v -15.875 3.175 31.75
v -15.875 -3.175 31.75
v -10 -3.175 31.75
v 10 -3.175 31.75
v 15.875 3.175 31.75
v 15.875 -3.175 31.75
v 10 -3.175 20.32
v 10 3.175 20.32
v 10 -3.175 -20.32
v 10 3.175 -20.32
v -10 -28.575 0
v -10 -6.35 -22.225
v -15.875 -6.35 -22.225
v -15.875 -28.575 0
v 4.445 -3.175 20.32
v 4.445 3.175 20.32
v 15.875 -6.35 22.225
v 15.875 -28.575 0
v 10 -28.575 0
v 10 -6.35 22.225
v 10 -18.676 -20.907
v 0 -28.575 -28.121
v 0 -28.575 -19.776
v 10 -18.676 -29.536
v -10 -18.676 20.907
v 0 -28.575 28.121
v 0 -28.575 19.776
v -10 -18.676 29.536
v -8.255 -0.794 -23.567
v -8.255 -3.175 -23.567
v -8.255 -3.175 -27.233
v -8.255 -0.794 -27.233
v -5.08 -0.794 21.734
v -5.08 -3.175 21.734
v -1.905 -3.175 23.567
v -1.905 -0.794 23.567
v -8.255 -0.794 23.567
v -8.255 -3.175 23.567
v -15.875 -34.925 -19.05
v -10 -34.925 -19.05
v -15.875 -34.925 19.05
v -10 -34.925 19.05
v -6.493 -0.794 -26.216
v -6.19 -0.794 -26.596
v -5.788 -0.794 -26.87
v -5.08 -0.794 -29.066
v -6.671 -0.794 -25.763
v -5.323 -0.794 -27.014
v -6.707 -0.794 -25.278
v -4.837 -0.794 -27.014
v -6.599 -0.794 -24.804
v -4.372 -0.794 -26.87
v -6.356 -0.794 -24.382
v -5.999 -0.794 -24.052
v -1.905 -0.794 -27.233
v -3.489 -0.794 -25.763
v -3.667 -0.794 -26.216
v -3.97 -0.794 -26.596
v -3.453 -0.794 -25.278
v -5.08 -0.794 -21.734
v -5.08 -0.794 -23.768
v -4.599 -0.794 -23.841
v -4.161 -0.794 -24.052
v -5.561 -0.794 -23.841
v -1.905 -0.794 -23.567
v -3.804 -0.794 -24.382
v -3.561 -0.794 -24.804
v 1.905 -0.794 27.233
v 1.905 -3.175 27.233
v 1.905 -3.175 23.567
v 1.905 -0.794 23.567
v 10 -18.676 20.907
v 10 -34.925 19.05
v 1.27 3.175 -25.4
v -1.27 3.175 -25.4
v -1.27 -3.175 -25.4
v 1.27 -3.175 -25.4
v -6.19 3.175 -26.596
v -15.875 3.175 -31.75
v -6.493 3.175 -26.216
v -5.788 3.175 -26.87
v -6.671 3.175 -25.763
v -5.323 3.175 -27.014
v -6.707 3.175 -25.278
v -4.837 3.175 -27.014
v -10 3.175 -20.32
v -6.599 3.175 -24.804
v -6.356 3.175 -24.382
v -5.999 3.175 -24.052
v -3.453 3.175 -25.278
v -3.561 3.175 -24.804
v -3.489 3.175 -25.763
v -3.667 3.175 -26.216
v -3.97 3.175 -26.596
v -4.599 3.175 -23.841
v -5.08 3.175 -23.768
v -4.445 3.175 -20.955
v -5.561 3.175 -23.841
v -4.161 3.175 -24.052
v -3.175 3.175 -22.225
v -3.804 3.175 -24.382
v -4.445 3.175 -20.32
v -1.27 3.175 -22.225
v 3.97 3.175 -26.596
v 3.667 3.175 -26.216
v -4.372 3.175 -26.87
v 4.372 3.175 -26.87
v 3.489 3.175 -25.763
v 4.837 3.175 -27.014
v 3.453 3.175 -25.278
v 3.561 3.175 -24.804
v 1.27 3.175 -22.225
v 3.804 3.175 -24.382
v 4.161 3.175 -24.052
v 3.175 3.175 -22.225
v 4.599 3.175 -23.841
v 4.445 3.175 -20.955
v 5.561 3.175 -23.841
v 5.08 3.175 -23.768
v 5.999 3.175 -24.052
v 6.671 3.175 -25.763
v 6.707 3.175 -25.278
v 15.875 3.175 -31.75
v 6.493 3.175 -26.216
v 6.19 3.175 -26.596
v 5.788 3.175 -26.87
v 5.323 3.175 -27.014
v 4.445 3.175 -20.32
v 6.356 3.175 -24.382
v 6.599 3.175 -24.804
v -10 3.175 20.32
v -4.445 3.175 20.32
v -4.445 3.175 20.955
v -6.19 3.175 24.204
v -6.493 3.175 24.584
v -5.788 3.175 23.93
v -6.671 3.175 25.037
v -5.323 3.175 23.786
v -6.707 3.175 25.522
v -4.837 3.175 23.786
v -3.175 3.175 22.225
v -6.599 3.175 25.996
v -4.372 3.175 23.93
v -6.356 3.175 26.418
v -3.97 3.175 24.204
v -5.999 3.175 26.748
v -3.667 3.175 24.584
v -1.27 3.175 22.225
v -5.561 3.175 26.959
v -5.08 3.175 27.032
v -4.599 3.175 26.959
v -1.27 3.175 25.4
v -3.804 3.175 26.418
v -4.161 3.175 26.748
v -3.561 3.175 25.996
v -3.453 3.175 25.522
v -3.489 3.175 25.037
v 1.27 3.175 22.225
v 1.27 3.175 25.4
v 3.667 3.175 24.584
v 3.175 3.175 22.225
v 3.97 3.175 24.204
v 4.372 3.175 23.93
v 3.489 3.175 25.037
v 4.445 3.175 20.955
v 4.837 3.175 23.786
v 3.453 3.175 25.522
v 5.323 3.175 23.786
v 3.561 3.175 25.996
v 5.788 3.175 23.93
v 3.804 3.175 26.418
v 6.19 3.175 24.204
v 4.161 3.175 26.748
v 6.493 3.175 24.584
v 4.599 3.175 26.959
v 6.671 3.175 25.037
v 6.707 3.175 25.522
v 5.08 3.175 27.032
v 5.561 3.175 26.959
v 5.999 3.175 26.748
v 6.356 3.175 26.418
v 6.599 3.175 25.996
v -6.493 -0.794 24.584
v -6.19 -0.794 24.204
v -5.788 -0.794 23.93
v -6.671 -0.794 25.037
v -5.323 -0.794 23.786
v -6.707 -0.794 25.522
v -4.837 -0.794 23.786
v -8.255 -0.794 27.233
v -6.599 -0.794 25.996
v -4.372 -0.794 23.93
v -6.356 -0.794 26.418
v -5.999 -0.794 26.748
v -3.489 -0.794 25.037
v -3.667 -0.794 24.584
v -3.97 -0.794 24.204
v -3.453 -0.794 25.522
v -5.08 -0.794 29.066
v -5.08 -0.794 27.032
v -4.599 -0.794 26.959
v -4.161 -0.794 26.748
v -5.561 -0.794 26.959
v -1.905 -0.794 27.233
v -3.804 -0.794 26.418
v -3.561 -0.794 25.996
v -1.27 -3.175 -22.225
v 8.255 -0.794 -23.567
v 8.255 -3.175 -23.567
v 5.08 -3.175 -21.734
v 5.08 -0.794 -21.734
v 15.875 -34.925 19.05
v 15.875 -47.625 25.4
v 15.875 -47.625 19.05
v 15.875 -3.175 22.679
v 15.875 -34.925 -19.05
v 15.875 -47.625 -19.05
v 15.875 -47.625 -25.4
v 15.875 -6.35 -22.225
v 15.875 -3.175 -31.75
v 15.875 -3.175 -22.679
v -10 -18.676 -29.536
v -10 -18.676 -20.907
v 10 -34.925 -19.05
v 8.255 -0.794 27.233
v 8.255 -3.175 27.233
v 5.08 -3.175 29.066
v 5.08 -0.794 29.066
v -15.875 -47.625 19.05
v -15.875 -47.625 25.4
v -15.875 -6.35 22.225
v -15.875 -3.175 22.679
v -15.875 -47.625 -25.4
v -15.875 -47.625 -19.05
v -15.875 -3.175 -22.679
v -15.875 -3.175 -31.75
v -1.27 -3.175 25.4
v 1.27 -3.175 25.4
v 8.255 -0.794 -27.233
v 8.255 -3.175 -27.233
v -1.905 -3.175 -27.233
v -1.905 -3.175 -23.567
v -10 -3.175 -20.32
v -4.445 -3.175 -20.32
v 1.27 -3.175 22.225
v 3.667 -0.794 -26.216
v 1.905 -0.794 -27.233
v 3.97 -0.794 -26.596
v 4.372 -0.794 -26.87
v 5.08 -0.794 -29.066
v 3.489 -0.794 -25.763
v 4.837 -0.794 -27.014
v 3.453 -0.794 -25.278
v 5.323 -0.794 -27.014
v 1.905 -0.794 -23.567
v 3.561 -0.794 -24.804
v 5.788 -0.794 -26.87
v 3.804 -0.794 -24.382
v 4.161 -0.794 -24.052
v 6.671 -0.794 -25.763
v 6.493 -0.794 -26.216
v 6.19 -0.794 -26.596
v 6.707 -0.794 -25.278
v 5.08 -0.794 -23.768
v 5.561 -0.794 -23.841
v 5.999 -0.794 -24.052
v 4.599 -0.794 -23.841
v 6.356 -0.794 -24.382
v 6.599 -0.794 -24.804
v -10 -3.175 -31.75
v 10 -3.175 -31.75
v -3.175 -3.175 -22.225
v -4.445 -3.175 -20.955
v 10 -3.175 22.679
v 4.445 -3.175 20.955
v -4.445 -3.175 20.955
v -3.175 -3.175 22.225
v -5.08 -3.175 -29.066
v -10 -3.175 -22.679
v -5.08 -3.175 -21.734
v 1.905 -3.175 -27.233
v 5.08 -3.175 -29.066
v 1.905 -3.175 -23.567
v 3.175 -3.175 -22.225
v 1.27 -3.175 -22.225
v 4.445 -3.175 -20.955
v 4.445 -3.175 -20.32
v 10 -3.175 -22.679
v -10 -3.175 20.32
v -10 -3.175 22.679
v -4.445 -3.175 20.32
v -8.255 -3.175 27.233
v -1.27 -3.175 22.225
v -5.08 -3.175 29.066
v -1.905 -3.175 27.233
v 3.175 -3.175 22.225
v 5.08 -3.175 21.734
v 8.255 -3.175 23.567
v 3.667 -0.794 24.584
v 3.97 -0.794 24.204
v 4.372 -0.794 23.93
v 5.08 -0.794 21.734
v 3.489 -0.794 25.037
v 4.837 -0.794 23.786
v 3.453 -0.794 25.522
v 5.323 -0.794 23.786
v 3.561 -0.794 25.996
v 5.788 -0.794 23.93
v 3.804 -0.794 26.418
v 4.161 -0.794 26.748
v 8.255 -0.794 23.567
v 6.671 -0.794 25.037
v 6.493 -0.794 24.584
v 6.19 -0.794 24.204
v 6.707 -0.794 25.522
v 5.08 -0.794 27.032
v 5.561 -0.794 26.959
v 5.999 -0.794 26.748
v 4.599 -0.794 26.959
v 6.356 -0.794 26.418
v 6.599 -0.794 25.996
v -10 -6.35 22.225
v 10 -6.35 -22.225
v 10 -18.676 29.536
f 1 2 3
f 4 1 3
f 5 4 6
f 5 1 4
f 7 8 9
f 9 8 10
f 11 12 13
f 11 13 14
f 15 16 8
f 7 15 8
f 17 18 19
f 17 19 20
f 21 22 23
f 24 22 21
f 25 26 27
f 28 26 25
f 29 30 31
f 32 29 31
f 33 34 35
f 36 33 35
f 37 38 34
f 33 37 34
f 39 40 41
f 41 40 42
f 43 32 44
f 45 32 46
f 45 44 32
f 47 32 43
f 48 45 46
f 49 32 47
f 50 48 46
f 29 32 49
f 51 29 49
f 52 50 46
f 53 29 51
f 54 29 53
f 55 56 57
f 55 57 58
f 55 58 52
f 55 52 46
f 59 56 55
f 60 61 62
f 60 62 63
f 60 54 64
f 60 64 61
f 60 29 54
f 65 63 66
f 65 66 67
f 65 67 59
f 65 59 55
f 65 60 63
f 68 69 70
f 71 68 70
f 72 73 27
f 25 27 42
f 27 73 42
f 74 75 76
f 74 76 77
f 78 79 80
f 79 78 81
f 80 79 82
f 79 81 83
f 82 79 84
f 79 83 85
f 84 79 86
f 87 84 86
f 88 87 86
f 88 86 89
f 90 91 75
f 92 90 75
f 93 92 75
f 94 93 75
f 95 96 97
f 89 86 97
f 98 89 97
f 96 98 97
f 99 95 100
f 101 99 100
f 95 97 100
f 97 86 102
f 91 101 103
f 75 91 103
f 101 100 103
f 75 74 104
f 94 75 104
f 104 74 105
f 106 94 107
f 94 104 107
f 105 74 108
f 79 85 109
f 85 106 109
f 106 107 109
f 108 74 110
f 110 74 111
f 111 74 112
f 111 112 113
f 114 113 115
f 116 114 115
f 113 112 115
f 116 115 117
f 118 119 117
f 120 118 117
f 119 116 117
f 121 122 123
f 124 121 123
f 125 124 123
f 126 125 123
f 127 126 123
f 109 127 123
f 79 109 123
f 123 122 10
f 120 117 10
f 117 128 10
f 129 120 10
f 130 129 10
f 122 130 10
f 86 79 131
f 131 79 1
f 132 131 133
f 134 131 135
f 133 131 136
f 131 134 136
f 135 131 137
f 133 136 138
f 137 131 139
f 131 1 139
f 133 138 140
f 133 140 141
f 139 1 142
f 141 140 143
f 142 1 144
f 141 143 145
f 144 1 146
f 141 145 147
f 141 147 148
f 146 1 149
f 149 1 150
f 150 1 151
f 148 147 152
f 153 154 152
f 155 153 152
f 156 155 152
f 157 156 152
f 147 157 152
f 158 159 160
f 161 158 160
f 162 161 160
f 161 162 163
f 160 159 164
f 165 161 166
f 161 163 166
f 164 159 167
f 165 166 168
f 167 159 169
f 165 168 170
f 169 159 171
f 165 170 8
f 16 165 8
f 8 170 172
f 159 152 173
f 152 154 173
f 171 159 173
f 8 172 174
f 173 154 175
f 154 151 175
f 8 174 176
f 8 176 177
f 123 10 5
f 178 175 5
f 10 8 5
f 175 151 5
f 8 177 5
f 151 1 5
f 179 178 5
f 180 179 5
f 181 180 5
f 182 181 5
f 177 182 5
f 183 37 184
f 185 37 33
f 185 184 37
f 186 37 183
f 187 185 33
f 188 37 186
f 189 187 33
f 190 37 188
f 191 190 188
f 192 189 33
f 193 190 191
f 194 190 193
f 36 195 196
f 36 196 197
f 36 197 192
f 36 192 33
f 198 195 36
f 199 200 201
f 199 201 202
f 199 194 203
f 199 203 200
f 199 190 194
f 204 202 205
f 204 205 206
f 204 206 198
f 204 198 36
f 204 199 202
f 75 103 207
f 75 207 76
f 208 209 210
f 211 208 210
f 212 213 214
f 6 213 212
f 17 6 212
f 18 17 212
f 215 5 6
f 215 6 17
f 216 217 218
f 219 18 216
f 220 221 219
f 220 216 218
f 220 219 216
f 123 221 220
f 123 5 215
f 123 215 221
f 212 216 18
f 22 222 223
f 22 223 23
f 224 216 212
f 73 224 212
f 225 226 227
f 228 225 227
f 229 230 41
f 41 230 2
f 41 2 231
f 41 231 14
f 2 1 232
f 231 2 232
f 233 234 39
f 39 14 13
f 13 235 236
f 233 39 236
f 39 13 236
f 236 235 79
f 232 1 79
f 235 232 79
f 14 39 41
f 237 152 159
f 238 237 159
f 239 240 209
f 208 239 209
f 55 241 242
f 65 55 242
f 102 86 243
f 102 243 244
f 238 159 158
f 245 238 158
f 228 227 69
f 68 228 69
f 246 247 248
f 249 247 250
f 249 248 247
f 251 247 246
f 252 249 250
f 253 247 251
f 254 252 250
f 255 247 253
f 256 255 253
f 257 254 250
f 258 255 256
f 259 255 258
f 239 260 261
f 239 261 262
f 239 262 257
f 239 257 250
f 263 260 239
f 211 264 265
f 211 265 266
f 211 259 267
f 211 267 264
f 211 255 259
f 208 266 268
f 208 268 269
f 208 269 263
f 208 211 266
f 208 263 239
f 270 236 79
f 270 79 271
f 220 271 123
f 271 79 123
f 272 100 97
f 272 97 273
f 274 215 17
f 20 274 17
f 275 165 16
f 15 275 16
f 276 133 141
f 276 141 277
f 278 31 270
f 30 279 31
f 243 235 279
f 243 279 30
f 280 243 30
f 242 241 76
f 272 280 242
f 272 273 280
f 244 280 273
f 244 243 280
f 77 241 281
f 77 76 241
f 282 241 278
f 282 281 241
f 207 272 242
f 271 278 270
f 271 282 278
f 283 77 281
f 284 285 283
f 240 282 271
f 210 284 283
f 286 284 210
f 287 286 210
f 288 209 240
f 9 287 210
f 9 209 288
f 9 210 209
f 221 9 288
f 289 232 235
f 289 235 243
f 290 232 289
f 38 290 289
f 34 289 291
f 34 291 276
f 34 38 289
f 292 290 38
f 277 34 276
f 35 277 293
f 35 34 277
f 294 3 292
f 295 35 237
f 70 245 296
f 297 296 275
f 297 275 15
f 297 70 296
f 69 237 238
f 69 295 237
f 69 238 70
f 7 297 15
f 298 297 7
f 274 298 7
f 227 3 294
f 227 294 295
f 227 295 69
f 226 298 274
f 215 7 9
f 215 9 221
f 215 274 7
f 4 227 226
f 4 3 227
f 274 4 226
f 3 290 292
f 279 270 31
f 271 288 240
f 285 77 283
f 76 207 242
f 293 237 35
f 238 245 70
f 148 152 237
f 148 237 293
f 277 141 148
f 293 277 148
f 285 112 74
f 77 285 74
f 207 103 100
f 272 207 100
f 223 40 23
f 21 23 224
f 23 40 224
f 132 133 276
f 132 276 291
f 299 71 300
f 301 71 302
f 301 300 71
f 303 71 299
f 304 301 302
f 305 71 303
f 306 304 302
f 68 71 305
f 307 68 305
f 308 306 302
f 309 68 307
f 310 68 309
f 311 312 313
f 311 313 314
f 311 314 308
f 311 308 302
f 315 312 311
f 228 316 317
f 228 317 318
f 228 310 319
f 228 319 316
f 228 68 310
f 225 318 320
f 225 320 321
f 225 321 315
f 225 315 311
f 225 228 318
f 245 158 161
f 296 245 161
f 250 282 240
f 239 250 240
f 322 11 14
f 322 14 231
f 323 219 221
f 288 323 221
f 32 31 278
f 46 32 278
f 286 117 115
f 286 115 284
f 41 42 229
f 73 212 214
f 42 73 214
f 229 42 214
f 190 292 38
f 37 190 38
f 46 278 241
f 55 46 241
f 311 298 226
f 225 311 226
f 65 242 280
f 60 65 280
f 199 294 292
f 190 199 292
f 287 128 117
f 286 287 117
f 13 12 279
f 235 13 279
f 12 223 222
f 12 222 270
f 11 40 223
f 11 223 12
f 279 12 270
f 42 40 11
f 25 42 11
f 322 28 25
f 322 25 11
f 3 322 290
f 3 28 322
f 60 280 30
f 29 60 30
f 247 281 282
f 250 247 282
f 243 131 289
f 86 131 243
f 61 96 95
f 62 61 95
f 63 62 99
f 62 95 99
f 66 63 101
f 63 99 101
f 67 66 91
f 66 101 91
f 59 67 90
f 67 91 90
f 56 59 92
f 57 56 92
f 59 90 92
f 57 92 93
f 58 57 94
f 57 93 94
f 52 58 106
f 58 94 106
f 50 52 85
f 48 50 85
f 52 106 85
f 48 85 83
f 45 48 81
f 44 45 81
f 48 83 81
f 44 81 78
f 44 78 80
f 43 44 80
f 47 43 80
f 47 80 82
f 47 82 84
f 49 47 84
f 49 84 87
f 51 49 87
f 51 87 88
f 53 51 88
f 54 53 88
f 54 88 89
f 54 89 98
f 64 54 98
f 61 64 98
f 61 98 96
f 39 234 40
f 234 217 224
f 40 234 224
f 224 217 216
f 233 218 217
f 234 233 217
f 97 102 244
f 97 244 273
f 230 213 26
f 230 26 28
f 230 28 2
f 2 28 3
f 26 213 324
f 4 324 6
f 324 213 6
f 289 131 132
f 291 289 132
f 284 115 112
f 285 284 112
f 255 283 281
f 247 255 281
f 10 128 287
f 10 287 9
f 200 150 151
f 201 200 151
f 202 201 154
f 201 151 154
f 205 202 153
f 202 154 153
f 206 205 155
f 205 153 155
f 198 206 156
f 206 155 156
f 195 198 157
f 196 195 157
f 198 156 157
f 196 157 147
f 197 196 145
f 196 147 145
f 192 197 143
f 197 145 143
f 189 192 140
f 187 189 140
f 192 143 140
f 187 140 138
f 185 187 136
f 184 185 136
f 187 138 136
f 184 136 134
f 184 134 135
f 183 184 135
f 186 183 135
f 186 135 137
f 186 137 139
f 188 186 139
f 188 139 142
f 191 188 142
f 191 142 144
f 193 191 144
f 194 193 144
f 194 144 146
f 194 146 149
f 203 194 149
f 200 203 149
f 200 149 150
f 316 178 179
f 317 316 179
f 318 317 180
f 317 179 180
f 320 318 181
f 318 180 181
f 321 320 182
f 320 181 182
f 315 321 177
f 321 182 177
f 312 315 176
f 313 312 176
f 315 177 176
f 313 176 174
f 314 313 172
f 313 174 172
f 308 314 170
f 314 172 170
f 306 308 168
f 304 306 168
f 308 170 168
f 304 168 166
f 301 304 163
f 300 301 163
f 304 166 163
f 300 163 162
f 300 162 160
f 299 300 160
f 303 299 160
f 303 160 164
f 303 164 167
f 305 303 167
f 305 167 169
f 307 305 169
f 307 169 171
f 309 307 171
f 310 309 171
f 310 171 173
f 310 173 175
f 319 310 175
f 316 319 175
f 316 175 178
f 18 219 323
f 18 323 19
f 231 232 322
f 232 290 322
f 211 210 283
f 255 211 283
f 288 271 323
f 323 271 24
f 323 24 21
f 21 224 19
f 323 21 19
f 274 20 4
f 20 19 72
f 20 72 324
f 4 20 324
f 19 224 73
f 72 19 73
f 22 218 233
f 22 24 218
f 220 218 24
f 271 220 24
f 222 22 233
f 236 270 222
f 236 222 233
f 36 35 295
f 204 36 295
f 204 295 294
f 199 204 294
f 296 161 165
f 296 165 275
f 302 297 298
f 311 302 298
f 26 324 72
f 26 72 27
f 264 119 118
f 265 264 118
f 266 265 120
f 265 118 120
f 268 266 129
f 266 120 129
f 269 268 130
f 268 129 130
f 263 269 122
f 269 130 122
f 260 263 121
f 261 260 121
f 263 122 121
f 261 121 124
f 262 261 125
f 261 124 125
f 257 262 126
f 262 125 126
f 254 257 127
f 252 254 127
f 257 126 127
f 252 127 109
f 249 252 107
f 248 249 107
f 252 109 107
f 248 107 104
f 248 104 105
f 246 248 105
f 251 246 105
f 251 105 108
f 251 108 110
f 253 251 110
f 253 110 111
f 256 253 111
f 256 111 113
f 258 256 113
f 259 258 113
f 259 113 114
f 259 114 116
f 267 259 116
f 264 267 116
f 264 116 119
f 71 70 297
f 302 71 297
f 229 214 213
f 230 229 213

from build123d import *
from build123d.topology import SkipClean

# Parameters (mm, degrees)
SKETCH2_W           = 31.75
SKETCH2_H           = 6.35
BOSS_EXTRUDE2_DEPTH = 31.75
SKETCH3_W           = 19.999999878
SKETCH3_H           = 40.64
CUT_EXTRUDE1_DEPTH  = 37.061067996
SKETCH4_R           = 1.63195
CUT_EXTRUDE2_DEPTH  = 37.061067996
SKETCH7_W           = 3.175
SKETCH7_H           = 1.905
SKETCH7_W_2         = 2.54
SKETCH7_H_2         = 3.175
CUT_EXTRUDE4_DEPTH  = 37.061067996
CHAMFER1_SIZE       = 1.27
CUT_EXTRUDE3_DEPTH  = 2.38125
BOSS_EXTRUDE5_DEPTH = 31.75
SKETCH12_W          = 19.999999878
SKETCH12_H          = 25.4
CUT_EXTRUDE5_DEPTH  = 81.946934778
BOSS_EXTRUDE6_DEPTH = 9.071430469
BOSS_EXTRUDE7_DEPTH = 9.071428449
BOSS_EXTRUDE8_DEPTH = 31.75
SKETCH16_W          = 19.999999878
SKETCH16_H          = 45.357142858
SKETCH18_W          = 19.999999878
SKETCH18_H          = 38.1


with BuildPart() as part:
    # Sketch2 → Boss-Extrude2 (new, symmetric)
    with BuildSketch(Plane.XY):
        Rectangle(SKETCH2_W, SKETCH2_H)
    extrude(amount=BOSS_EXTRUDE2_DEPTH, both=True)

    # Sketch3 → Cut-Extrude1 (cut, through all)
    with BuildSketch(Plane(origin=(0, 3.175, 0), x_dir=(1, 0, 0), z_dir=(0, 1, 0))):
        Rectangle(SKETCH3_W, SKETCH3_H)
    extrude(amount=-CUT_EXTRUDE1_DEPTH, mode=Mode.SUBTRACT)

    # Sketch4 → Cut-Extrude2 (cut, through all)
    with BuildSketch(Plane(origin=(0, 3.175, 0), x_dir=(1, 0, 0), z_dir=(0, 1, 0))):
        with Locations(Location((-5.08, 25.4, 0), (0, 0, 270))):
            Circle(SKETCH4_R)
        with Locations(Location((5.08, 25.4, 0), (0, 0, 270))):
            Circle(SKETCH4_R)
        with Locations(Location((-5.08, -25.4, 0), (0, 0, 270))):
            Circle(SKETCH4_R)
        with Locations(Location((5.08, -25.4, 0), (0, 0, 270))):
            Circle(SKETCH4_R)
    extrude(amount=-CUT_EXTRUDE2_DEPTH, mode=Mode.SUBTRACT)

    # Sketch7 → Cut-Extrude4 (cut, through all)
    with BuildSketch(Plane(origin=(0, 3.175, 0), x_dir=(1, 0, 0), z_dir=(0, 1, 0))):
        with Locations((-2.8575, 21.2725)):
            Rectangle(SKETCH7_W, SKETCH7_H)
        with Locations((2.8575, 21.2725)):
            Rectangle(SKETCH7_W, SKETCH7_H)
        with Locations((2.8575, -21.2725)):
            Rectangle(SKETCH7_W, SKETCH7_H)
        with Locations((-2.8575, -21.2725)):
            Rectangle(SKETCH7_W, SKETCH7_H)
        with Locations((0, 21.2725)):
            Rectangle(SKETCH7_W_2, SKETCH7_H)
        with Locations((0, 23.8125)):
            Rectangle(SKETCH7_W_2, SKETCH7_H_2)
        with Locations((0, -21.2725)):
            Rectangle(SKETCH7_W_2, SKETCH7_H)
        with Locations((0, -23.8125)):
            Rectangle(SKETCH7_W_2, SKETCH7_H_2)
    extrude(amount=-CUT_EXTRUDE4_DEPTH, mode=Mode.SUBTRACT)

    # Chamfer1
    chamfer1_edges = [part.edges().sort_by_distance(p)[0] for p in [
        (-4.445, 0, -22.225),
        (4.445, 0, -22.225),
        (4.445, 0, 22.225),
        (-4.445, 0, 22.225),
    ]]
    chamfer(chamfer1_edges, length=CHAMFER1_SIZE)

    # Sketch6 → Cut-Extrude3 (cut)
    with BuildSketch(Plane.XZ.offset(3.175)):
        Polygon((-1.905, 27.233087105), (-5.08, 29.066174209), (-8.255, 27.233087105), (-8.255, 23.566912895), (-5.08, 21.733825791), (-1.905, 23.566912895), align=None)
        Polygon((8.255, 27.233087105), (5.08, 29.066174209), (1.905, 27.233087105), (1.905, 23.566912895), (5.08, 21.733825791), (8.255, 23.566912895), align=None)
        Polygon((8.255, -23.566912895), (5.08, -21.733825791), (1.905, -23.566912895), (1.905, -27.233087105), (5.08, -29.066174209), (8.255, -27.233087105), align=None)
        Polygon((-1.905, -23.566912895), (-5.08, -21.733825791), (-8.255, -23.566912895), (-8.255, -27.233087105), (-5.08, -29.066174209), (-1.905, -27.233087105), align=None)
    extrude(amount=-CUT_EXTRUDE3_DEPTH, mode=Mode.SUBTRACT)

    # Sketch10 → Boss-Extrude5 (add, through all)
    with BuildSketch(Plane(origin=(15.875, 0, 0), x_dir=(0, 0, -1), z_dir=(1, 0, 0))):
        Polygon((25.4, -47.625), (19.05, -47.625), (19.05, -34.925), (-19.05, -34.925), (-19.05, -47.625), (-25.4, -47.625), (-31.75, -3.175), (-22.678571429, -3.175), (-19.05, -28.575), (19.05, -28.575), (22.678571429, -3.175), (31.75, -3.175), align=None)
    extrude(amount=-BOSS_EXTRUDE5_DEPTH)

    # Sketch12 → Cut-Extrude5 (cut, through all)
    with BuildSketch(Plane.XY.offset(31.75)):
        with Locations((0, -15.875)):
            Rectangle(SKETCH12_W, SKETCH12_H)
    extrude(amount=-CUT_EXTRUDE5_DEPTH, mode=Mode.SUBTRACT)

    # Sketch13 → Boss-Extrude6 (add, along a direction that is not the sketch's normal)
    with BuildSketch(Plane(origin=(0, -4.5085, -31.5595), x_dir=(-1, 0, 0), z_dir=(0, -0.14142135623730953, -0.9899494936611667))):
        Polygon((-9.999999939, -24.310836213), (0, -24.310836213), (-9.999999939, -14.310836274), align=None)
        Polygon((9.999999939, -14.310836274), (0, -24.310836213), (9.999999939, -24.310836213), align=None)
    extrude(amount=-BOSS_EXTRUDE6_DEPTH, dir=(0, 0, -1))

    # Sketch14 → Boss-Extrude7 (add, along a direction that is not the sketch's normal)
    with SkipClean():  # the faces are left unmerged after this step: merging them gives an invalid solid
        with BuildSketch(Plane(origin=(0, -4.5085, 31.5595), x_dir=(1, 0, 0), z_dir=(0, -0.14142135623730945, 0.9899494936611667))):
            Polygon((-9.999999939, -24.310836213), (0, -24.310836213), (-9.999999939, -14.310836274), align=None)
            Polygon((9.999999939, -14.310836274), (0, -24.310836213), (9.999999939, -24.310836213), align=None)
        extrude(amount=-BOSS_EXTRUDE7_DEPTH, dir=(0, 0, 1))

    # Sketch15 → Boss-Extrude8 (add)
    with BuildSketch(Plane(origin=(15.875, 0, 0), x_dir=(0, 0, -1), z_dir=(1, 0, 0))):
        Polygon((22.225, -6.35), (0, -28.575), (19.05, -28.575), align=None)
        Polygon((-19.05, -28.575), (0, -28.575), (-22.225, -6.35), align=None)
    extrude(amount=-BOSS_EXTRUDE8_DEPTH)

    # Sketch16 → Cut-Loft1 section 0
    with BuildSketch(Plane.XZ.offset(3.175)):
        Rectangle(SKETCH16_W, SKETCH16_H)
    # Sketch18 → Cut-Loft1 section 1
    with BuildSketch(Plane.XZ.offset(34.925)):
        Rectangle(SKETCH18_W, SKETCH18_H)
    loft(mode=Mode.SUBTRACT)


solid = part.part
